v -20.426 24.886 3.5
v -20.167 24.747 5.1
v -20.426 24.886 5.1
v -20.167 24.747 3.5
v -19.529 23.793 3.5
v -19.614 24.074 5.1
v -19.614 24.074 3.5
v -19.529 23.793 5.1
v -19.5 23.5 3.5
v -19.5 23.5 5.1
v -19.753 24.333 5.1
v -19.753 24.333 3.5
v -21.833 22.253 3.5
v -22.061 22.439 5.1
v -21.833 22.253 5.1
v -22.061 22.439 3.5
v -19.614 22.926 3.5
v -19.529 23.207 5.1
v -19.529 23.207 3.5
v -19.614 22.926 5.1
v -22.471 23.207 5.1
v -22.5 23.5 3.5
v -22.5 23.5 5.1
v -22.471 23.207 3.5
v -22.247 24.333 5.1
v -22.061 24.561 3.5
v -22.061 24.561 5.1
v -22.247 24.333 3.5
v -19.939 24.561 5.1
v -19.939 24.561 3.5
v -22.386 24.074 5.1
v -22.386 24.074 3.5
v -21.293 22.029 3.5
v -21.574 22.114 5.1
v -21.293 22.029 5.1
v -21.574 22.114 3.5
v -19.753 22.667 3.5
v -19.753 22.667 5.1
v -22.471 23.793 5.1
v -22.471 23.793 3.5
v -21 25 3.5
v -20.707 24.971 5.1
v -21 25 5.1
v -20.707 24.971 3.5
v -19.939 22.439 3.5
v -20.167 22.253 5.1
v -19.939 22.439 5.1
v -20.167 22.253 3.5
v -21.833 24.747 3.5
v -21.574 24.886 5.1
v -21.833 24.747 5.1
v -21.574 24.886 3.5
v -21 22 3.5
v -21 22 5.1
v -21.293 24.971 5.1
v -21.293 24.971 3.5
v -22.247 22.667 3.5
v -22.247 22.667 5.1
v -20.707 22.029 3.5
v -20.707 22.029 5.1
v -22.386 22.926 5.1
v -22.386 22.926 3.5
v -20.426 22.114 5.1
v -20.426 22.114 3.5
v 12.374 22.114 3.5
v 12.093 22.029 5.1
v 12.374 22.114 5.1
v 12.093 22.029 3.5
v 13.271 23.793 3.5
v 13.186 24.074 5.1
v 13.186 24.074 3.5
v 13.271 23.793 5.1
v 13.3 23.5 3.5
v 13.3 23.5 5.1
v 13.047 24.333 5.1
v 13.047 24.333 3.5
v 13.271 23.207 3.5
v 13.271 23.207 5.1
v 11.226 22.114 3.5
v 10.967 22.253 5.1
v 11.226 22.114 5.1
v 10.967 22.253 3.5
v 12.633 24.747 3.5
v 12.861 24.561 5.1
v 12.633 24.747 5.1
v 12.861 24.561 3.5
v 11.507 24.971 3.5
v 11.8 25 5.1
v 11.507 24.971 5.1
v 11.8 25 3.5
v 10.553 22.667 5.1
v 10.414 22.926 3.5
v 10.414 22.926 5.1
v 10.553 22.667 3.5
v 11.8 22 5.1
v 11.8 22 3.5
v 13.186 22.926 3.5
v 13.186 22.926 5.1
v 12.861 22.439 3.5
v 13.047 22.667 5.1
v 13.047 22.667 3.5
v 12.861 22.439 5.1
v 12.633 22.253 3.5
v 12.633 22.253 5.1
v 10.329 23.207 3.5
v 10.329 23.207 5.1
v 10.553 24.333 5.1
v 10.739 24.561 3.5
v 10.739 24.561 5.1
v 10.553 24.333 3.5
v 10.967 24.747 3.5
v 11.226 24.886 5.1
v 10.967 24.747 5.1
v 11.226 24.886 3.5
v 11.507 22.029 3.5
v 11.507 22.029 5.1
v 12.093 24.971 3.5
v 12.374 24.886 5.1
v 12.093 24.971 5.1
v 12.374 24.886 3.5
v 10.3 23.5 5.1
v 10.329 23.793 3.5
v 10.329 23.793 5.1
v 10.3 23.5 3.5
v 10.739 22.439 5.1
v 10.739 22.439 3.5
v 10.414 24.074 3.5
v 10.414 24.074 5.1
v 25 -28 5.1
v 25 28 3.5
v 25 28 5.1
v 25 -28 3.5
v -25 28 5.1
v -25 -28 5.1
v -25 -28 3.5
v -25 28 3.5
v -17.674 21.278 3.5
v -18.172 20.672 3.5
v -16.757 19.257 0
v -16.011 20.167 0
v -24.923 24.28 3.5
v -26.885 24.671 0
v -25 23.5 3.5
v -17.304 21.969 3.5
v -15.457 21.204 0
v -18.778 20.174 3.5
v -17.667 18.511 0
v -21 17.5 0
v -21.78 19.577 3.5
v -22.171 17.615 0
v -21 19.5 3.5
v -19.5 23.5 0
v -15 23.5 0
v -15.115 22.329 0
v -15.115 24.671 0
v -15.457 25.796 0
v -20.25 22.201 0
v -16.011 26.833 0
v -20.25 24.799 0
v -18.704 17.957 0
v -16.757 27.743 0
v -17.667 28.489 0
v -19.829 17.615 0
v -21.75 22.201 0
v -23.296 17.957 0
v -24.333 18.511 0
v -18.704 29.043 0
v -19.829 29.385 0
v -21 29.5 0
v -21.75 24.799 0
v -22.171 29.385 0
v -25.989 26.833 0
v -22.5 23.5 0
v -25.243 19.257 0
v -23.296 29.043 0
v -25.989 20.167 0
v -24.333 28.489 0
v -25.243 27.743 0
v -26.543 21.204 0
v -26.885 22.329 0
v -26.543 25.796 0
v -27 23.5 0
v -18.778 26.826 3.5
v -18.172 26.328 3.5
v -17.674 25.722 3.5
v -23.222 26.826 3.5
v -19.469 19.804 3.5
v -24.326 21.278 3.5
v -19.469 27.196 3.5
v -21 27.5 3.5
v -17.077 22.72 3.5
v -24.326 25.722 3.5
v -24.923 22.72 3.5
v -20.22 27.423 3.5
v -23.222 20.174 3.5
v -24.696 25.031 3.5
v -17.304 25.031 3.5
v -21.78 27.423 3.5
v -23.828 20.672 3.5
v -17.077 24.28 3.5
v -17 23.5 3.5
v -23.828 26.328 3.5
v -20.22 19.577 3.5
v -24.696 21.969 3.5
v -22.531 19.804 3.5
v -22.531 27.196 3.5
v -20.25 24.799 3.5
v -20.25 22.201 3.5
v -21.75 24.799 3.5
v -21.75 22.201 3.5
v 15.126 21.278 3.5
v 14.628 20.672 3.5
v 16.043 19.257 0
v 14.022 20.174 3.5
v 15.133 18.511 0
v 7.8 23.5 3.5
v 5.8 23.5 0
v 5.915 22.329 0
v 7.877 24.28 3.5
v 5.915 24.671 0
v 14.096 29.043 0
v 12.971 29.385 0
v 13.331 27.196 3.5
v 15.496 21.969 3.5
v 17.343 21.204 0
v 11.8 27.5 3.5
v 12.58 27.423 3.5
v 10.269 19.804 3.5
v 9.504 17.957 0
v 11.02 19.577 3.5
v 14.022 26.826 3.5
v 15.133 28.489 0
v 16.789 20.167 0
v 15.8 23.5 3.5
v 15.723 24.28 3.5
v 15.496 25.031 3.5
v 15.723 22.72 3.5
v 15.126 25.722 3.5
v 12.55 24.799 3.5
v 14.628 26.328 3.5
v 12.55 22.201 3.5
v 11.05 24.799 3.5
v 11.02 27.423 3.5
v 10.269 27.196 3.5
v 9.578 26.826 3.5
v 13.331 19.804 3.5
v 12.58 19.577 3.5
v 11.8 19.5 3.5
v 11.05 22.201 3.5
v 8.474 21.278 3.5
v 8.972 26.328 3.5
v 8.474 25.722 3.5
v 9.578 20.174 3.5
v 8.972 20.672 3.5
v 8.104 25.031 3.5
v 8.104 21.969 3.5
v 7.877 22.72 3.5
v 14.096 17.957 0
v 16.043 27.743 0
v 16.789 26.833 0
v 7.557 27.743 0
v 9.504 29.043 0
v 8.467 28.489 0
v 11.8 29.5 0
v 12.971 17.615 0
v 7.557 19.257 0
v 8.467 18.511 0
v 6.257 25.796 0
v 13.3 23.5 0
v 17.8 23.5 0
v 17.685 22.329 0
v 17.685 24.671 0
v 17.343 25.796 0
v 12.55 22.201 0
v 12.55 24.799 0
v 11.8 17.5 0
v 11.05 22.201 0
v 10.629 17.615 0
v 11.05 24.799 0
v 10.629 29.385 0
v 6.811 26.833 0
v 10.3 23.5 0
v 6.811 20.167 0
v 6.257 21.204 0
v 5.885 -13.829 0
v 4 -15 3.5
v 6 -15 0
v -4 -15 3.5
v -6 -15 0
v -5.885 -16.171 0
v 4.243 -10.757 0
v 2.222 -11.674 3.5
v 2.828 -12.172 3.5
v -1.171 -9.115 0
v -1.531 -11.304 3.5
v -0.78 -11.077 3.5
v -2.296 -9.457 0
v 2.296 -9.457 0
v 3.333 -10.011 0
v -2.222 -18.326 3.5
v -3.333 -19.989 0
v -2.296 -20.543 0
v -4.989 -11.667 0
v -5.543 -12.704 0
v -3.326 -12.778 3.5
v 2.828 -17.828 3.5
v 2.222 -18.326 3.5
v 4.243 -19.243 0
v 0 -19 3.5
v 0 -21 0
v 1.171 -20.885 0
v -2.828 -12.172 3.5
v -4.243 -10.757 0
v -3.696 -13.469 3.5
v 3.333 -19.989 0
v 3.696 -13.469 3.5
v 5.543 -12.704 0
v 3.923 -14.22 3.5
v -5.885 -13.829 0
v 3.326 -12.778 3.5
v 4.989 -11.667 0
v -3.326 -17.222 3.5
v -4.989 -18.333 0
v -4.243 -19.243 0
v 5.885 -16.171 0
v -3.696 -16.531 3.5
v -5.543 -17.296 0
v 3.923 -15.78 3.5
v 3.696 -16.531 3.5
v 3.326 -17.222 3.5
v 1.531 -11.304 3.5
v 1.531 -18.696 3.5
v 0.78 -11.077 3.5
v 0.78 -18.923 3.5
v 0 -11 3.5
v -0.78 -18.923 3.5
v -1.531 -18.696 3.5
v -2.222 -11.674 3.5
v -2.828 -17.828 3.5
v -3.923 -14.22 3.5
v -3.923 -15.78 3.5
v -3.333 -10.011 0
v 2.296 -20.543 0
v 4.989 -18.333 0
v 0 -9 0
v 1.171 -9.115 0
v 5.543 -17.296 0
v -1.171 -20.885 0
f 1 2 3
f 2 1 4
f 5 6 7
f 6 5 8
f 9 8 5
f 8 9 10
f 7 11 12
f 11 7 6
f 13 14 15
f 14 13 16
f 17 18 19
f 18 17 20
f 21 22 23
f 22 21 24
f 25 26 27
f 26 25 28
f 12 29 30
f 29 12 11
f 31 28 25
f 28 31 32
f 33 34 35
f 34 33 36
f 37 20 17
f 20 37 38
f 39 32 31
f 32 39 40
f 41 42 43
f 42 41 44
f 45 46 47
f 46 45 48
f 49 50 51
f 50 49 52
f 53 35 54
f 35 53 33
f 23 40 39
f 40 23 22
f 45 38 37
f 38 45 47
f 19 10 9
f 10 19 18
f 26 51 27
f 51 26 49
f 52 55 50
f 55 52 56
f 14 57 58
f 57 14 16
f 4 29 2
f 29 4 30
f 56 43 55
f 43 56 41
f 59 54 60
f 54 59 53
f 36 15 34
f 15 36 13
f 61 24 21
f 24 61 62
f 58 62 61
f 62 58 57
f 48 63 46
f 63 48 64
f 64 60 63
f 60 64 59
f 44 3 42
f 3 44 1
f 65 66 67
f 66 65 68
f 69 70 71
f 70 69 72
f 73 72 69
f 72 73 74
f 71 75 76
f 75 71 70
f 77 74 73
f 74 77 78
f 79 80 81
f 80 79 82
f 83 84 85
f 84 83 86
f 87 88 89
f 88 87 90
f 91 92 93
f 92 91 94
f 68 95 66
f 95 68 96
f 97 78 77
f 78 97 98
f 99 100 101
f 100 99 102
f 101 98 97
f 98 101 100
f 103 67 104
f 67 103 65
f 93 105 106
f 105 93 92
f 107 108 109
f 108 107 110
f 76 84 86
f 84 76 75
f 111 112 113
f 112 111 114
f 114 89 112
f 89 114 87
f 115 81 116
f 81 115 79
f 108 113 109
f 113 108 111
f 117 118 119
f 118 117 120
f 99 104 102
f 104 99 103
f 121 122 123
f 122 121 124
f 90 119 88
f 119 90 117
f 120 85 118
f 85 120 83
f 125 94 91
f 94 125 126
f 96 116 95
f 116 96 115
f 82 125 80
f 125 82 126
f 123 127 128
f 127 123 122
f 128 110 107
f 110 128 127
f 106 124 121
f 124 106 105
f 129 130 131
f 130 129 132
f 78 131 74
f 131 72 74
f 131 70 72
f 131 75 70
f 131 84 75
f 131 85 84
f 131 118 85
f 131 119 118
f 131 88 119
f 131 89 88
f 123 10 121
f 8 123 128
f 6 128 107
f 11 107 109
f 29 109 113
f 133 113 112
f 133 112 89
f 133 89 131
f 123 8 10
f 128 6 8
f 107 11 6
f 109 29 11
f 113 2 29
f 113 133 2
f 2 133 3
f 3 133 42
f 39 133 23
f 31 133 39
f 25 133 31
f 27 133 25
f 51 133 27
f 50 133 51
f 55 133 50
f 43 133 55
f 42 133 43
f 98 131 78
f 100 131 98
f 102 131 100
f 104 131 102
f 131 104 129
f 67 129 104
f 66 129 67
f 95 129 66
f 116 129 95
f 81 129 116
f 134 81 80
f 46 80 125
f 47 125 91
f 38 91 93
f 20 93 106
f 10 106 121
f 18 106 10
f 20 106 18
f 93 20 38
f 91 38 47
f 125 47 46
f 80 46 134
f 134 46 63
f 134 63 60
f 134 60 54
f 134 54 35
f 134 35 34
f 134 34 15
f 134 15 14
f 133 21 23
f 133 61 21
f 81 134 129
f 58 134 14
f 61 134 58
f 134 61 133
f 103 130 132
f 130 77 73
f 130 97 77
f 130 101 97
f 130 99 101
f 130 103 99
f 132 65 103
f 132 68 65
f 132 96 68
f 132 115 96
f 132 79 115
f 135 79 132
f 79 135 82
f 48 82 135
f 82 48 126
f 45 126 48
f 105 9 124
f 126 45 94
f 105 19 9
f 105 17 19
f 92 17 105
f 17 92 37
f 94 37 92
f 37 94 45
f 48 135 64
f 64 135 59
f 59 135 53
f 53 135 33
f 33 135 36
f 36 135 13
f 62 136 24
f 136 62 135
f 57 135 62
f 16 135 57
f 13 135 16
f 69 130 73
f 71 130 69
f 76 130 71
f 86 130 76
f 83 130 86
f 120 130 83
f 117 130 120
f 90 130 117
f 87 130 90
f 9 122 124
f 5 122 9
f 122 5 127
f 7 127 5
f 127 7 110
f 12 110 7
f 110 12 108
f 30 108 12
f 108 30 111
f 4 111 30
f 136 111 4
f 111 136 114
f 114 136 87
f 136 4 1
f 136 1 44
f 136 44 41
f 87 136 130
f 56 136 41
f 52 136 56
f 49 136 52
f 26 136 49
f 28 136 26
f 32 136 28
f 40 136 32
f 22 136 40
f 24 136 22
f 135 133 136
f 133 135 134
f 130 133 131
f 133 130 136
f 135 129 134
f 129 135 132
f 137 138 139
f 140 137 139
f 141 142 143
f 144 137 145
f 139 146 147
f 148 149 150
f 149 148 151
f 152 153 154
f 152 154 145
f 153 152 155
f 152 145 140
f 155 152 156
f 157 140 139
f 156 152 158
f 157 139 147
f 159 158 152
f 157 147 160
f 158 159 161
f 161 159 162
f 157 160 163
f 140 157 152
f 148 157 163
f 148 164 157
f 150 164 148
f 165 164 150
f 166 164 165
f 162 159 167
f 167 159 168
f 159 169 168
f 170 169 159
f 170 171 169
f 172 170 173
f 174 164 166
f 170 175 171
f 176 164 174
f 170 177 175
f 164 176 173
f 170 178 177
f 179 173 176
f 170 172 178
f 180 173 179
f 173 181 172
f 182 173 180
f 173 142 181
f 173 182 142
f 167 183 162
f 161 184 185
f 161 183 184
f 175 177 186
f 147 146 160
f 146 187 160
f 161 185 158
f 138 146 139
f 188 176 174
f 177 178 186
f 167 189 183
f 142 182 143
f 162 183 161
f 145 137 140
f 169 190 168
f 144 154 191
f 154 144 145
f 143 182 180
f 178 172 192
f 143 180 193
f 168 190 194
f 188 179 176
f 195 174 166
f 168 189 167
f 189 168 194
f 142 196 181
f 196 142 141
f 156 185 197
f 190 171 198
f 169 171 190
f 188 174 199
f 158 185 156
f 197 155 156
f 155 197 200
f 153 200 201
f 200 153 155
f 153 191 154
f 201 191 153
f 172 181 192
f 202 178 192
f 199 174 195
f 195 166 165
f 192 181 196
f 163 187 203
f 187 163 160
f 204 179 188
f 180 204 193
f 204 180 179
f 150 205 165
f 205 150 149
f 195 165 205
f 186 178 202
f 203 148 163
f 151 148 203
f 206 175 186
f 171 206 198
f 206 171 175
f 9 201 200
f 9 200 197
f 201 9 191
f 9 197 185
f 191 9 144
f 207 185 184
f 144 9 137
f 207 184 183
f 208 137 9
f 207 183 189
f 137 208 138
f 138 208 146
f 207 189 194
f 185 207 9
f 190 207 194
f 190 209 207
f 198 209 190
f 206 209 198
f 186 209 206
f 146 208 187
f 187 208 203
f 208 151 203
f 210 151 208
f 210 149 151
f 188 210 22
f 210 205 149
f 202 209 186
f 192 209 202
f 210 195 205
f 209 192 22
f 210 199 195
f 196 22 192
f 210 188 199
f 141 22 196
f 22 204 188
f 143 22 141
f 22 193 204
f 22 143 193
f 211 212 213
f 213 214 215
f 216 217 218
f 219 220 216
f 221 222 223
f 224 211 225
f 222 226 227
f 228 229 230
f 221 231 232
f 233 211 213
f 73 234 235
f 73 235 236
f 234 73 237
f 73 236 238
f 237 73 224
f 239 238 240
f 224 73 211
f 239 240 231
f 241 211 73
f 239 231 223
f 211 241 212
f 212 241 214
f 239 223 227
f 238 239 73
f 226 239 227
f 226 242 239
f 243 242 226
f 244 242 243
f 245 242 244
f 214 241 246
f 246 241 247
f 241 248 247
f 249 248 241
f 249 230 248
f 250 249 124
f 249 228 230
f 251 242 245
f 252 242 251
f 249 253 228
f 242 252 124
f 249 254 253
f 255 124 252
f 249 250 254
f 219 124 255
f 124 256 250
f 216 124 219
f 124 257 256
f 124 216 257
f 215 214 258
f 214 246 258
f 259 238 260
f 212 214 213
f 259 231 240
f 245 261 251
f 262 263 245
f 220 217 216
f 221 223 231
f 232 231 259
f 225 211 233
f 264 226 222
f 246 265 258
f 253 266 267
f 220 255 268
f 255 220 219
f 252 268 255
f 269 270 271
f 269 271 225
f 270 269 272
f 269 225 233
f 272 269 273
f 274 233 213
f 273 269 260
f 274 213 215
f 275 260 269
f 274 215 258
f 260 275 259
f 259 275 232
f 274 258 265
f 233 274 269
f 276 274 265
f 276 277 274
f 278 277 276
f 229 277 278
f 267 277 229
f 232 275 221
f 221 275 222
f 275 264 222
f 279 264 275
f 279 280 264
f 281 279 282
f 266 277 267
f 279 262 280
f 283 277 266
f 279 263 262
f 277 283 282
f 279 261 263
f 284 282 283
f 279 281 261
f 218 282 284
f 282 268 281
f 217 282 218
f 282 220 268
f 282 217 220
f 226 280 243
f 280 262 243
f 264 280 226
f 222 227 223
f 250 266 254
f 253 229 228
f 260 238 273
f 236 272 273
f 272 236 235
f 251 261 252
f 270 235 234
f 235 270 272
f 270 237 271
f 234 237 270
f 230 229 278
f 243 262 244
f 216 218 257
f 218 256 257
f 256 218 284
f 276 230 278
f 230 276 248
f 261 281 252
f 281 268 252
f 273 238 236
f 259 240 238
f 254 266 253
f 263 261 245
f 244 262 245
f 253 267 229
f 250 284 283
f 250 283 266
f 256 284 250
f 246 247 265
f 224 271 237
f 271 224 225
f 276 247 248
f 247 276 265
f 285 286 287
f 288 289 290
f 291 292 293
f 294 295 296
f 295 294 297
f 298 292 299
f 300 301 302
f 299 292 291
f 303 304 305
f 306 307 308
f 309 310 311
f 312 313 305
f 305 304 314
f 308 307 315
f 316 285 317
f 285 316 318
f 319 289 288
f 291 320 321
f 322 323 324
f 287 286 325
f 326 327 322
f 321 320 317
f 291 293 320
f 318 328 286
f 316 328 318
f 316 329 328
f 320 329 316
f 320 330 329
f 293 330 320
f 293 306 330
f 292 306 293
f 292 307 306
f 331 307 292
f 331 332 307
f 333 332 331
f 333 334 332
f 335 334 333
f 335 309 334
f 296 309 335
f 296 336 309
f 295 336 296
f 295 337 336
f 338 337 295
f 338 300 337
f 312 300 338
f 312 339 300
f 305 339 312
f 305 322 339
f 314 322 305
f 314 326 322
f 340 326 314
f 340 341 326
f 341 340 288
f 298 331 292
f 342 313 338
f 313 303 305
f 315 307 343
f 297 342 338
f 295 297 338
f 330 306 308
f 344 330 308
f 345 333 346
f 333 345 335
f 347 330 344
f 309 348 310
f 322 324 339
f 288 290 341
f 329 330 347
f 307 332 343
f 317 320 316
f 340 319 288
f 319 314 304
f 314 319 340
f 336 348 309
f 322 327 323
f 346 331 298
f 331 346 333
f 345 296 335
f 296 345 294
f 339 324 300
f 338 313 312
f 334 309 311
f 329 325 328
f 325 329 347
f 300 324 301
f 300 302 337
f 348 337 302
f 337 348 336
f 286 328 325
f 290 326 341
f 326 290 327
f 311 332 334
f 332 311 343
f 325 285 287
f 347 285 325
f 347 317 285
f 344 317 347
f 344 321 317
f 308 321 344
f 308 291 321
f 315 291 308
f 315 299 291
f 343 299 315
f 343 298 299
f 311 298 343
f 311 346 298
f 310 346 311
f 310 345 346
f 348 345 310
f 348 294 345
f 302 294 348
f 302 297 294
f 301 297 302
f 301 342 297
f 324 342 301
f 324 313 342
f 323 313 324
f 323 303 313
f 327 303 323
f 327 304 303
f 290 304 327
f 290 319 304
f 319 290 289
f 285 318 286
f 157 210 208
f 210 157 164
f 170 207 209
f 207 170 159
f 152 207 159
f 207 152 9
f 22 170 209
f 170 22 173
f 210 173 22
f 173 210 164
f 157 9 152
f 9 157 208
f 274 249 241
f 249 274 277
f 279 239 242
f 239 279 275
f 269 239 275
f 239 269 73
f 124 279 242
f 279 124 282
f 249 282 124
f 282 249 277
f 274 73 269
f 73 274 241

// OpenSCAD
// For this (and likely other similar) 4 channel MOSFET boards: https://www.aliexpress.com/item/32746854103.html

z_offset = 3.5;

mounting_hole_positions = [
  [-(50 / 2) + 4, (56 / 2) - 4.5],
  [-(50 / 2) + 4 + 32.8, (56 / 2) - 4.5],
];
support_positions = [
  [-(50 / 2) + 4, (56 / 2) - 4.5],
  [-(50 / 2) + 4 + 32.8, (56 / 2) - 4.5],
  [0, -15],
];

module YYNMOS4_device() {
  translate([0, 0, (1.6 / 2) + z_offset]) {
    difference() {
      cube([50, 56, 1.6], center = true);

      // Mounting holes
      for (pos = mounting_hole_positions) {
        translate([pos[0], pos[1], 0]) {
          cylinder(h = 1.7, d = 3, $fn = 32, center = true);
        }
      }
    }
  }
}

module YYNMOS4_add() {
  // Mouting hole supports
  for (pos = support_positions) {
    translate([pos[0], pos[1]]) {
      cylinder(h = z_offset, d1 = 12, d2 = 8, $fn = 32);
    }
  }
}

module YYNMOS4_subtract(hole_extra_depth = 0) {
  // Mouting hole cutouts
  for (pos = mounting_hole_positions) {
    translate([pos[0], pos[1], -hole_extra_depth]) {
      cylinder(h = 1.6 + 3.5 + hole_extra_depth, d = 3, $fn = 6);
    }
  }
}

color("grey", 0.5) {
  YYNMOS4_device();
}
difference() {
  color("green") {
    YYNMOS4_add();
  }
  #YYNMOS4_subtract(hole_extra_depth = 1);
}
